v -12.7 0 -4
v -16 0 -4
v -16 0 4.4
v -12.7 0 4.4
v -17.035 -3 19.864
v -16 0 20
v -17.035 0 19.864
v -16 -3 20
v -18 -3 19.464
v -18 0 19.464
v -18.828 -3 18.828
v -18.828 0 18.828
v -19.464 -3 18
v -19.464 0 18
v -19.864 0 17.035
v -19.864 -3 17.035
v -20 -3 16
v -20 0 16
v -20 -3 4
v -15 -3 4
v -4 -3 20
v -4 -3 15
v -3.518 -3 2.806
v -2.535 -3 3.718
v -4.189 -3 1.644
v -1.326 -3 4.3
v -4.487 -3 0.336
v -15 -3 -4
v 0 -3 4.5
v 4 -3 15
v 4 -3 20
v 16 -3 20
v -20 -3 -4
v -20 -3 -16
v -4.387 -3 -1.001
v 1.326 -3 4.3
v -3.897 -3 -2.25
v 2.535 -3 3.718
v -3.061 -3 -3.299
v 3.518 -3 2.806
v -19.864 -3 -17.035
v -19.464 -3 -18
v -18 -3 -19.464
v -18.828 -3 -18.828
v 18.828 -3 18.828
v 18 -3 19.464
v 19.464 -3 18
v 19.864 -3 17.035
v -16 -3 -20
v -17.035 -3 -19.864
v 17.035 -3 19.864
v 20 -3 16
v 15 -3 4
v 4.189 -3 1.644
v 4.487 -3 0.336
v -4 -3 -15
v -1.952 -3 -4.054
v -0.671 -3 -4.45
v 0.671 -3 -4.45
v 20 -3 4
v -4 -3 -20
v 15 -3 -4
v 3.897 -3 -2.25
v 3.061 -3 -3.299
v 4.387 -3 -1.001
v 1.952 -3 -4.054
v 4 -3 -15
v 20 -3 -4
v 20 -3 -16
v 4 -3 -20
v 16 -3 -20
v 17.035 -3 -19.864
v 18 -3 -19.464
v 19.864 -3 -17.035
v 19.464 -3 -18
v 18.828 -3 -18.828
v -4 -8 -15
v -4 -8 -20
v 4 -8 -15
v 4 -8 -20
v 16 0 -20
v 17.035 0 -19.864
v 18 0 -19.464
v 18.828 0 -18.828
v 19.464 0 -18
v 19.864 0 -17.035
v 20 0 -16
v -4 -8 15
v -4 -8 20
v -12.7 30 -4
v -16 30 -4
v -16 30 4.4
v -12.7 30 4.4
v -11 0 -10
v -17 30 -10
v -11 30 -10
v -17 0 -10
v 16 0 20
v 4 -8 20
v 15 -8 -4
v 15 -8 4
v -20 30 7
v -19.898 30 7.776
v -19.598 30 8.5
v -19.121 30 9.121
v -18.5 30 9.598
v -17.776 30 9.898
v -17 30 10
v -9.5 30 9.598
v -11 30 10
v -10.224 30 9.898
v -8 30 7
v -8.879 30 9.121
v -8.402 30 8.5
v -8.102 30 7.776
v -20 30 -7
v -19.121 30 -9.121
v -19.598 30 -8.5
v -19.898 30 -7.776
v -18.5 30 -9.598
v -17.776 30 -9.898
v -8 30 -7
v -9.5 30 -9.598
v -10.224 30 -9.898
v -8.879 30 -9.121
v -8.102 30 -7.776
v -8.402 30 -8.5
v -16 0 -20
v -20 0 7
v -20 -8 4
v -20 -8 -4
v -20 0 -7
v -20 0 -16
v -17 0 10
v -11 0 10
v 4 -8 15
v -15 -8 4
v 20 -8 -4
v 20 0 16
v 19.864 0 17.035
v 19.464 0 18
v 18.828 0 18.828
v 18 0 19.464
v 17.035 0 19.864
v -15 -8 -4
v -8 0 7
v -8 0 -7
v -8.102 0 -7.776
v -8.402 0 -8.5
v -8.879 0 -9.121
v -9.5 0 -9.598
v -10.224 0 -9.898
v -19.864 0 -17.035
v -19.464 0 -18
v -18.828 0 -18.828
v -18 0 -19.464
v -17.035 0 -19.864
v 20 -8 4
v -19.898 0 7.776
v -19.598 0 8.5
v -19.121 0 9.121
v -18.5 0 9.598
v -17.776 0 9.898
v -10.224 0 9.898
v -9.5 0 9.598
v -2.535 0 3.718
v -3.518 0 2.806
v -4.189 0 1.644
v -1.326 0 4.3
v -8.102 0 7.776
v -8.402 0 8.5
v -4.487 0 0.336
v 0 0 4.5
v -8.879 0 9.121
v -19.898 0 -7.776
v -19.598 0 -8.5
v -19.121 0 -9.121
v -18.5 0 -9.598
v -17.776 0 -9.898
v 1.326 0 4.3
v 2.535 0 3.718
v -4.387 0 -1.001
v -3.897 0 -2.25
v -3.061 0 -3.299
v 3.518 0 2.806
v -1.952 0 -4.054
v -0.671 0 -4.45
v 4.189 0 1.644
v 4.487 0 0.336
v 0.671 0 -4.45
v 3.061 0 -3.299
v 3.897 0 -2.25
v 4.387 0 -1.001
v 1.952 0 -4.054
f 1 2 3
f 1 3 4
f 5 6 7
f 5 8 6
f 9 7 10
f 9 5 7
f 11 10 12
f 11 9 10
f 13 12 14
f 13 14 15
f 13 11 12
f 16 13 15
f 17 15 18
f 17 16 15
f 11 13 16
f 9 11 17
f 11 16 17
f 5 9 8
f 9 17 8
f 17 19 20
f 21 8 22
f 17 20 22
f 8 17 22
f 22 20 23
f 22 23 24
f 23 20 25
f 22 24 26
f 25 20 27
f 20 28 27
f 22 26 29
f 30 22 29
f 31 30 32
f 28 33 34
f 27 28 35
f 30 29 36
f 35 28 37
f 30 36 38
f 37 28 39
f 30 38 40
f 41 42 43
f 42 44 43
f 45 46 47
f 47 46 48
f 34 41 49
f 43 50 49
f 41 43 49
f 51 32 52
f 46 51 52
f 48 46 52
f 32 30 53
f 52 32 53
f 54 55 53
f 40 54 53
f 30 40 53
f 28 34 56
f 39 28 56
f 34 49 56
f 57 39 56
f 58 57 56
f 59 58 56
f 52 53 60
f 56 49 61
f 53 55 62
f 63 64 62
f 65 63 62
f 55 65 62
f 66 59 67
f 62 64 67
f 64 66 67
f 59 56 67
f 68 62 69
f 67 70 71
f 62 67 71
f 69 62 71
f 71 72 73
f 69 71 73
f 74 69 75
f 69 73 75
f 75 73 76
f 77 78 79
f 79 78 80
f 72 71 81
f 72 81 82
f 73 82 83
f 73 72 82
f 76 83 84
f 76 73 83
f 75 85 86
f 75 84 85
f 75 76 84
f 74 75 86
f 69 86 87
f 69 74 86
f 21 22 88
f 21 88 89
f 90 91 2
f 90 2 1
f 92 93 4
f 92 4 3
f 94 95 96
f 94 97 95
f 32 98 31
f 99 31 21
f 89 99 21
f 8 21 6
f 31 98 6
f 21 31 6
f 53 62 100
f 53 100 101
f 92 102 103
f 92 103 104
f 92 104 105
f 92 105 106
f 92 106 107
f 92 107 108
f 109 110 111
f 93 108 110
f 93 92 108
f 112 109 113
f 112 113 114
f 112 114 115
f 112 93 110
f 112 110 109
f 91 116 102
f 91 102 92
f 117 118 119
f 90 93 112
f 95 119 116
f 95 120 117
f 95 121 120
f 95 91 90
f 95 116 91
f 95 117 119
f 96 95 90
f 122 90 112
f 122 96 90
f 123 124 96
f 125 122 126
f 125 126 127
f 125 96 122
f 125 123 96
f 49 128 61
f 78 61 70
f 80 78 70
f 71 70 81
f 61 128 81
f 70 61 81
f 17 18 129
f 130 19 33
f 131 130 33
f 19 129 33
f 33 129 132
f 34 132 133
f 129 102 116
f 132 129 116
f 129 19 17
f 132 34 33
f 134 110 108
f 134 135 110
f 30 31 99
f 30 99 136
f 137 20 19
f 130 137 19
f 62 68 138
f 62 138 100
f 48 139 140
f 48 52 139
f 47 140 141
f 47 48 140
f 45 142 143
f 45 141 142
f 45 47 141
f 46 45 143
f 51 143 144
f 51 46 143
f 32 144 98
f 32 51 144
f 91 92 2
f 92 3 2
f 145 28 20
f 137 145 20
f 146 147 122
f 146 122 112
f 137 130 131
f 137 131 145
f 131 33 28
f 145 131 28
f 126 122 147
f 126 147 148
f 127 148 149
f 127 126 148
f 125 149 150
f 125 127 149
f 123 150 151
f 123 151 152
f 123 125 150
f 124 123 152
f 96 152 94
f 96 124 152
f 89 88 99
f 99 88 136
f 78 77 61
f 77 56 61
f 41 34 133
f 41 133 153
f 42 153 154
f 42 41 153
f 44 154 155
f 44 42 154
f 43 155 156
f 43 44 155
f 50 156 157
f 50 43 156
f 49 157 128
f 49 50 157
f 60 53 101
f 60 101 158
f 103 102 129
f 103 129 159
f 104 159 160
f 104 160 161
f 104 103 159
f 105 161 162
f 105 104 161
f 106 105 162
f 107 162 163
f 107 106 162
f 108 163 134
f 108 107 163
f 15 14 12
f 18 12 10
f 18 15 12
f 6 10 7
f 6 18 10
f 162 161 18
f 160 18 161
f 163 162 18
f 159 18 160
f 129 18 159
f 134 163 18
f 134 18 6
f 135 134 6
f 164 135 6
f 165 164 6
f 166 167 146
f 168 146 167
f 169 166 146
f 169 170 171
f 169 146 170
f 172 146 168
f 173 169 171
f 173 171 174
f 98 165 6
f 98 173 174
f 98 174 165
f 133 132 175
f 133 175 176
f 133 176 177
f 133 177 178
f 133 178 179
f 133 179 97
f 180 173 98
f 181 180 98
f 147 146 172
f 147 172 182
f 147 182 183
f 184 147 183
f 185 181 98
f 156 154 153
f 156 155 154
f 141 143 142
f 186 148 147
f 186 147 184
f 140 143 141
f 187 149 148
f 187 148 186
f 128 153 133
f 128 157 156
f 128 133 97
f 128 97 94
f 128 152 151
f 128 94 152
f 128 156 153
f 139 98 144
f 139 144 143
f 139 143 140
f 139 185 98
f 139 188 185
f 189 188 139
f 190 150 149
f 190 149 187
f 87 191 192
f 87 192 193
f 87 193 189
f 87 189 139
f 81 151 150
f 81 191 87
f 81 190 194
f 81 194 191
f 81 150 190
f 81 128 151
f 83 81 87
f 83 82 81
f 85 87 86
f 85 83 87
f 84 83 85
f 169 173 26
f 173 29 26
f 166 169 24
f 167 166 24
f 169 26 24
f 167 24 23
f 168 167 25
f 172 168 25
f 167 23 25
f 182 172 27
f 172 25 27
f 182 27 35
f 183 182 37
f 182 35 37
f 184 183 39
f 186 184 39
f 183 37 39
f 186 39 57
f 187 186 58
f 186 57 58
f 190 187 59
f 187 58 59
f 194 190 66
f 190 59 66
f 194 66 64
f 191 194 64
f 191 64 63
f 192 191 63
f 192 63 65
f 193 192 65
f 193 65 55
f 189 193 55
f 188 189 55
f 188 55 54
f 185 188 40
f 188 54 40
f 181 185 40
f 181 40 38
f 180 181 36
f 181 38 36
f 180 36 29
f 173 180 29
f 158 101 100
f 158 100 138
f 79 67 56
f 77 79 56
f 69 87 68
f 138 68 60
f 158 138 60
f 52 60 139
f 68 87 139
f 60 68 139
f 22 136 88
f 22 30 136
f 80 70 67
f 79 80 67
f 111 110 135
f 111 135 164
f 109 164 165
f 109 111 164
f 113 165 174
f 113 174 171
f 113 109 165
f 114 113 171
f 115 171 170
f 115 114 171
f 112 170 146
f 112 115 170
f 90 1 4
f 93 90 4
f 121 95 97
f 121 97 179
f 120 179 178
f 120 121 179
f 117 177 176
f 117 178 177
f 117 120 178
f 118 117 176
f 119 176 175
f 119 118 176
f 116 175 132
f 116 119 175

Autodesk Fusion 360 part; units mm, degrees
sketch "Sketch1" plane through (0, 0, 0) normal (0, 1, 0) x (1, 0, 0)
  line L0 (20, -20) -> (-20, -20)
  line L1 (-20, -20) -> (-20, 20)
  line L2 (-20, 20) -> (20, 20)
  line L3 (20, 20) -> (20, -20)
  line L4 (20, -20) -> (-20, 20) construction
  line L5 (-20, -20) -> (20, 20) construction
  line L6 (-20, 4) -> (-15, 4)
  line L7 (-15, 4) -> (-15, -4)
  line L8 (-15, -4) -> (-20, -4)
  line L9 (-20, -4) -> (-20, 4)
  line L10 (-4, 20) -> (4, 20)
  line L11 (4, 20) -> (4, 15)
  line L12 (4, 15) -> (-4, 15)
  line L13 (-4, 15) -> (-4, 20)
  line L14 (20, 4) -> (15, 4)
  line L15 (15, 4) -> (15, -4)
  line L16 (15, -4) -> (20, -4)
  line L17 (20, -4) -> (20, 4)
  line L18 (-4, -20) -> (4, -20)
  line L19 (4, -20) -> (4, -15)
  line L20 (4, -15) -> (-4, -15)
  line L21 (-4, -15) -> (-4, -20)
  dimension "d1" = 40
  dimension "d2" = 40
  dimension "d3" = 5
  dimension "d4" = 8
  dimension "d5" = 16
  dimension "d6" = 5
  dimension "d7" = 16
  dimension "d8" = 8
  dimension "d9" = 5
  dimension "d10" = 5
  dimension "d11" = 8
  dimension "d12" = 8
  dimension "d13" = 16
  dimension "d14" = 16
extrude "Extrude1" add sketch "Sketch1" against normal blind 3 contours L0 L1 L2 L3 L6 L7 L8 L11 L12 L13 L14 L15 L16 L19 L20 L21
extrude "Extrude2" add sketch "Sketch1" against normal blind 8 contours L0 L18 L19 L20 L21 | L3 L14 L15 L16 L17 | L1 L6 L7 L8 L9 | L2 L10 L11 L12 L13
hole "Hole1" at (0, 0, 0) direction (0, -1, 0) diameter 9 depth 30 tip angle 118
fillet "Fillet1" radius 4 4 edges at (20, -1.5, -20) (-20, -1.5, -20) (20, -1.5, 20) (-20, -1.5, 20)
sketch "Sketch2" plane through (0, 0, 0) normal (0, 1, 0) x (1, 0, 0)
  line L0 (-20, 10) -> (-8, 10)
  line L1 (-8, 10) -> (-8, -10)
  line L2 (-8, -10) -> (-20, -10)
  line L3 (-20, -10) -> (-20, 10)
  line L4 (-16, 4) -> (-12.7, 4)
  line L5 (-12.7, 4) -> (-12.7, -4.4)
  line L6 (-12.7, -4.4) -> (-16, -4.4)
  line L7 (-16, -4.4) -> (-16, 4)
  line L8 (-20, 20) -> (20, 20)
  dimension "d24" = 12
  dimension "d25" = 20
  dimension "d26" = 8.4
  dimension "d27" = 3.3
  dimension "d28" = 6
  dimension "d29" = 10
extrude "Extrude3" add sketch "Sketch2" along normal blind 30
fillet "Fillet2" radius 3 4 edges at (-8, 15, 10) (-20, 15, 10) (-8, 15, -10) (-20, 15, -10)
equation "d6 = d3"
equation "d7 = d5"
equation "d8 = d4"
equation "d9 = d3"
equation "d10 = d3"
equation "d11 = d4"
equation "d12 = d4"
equation "d13 = d7"
equation "d14 = d7"
